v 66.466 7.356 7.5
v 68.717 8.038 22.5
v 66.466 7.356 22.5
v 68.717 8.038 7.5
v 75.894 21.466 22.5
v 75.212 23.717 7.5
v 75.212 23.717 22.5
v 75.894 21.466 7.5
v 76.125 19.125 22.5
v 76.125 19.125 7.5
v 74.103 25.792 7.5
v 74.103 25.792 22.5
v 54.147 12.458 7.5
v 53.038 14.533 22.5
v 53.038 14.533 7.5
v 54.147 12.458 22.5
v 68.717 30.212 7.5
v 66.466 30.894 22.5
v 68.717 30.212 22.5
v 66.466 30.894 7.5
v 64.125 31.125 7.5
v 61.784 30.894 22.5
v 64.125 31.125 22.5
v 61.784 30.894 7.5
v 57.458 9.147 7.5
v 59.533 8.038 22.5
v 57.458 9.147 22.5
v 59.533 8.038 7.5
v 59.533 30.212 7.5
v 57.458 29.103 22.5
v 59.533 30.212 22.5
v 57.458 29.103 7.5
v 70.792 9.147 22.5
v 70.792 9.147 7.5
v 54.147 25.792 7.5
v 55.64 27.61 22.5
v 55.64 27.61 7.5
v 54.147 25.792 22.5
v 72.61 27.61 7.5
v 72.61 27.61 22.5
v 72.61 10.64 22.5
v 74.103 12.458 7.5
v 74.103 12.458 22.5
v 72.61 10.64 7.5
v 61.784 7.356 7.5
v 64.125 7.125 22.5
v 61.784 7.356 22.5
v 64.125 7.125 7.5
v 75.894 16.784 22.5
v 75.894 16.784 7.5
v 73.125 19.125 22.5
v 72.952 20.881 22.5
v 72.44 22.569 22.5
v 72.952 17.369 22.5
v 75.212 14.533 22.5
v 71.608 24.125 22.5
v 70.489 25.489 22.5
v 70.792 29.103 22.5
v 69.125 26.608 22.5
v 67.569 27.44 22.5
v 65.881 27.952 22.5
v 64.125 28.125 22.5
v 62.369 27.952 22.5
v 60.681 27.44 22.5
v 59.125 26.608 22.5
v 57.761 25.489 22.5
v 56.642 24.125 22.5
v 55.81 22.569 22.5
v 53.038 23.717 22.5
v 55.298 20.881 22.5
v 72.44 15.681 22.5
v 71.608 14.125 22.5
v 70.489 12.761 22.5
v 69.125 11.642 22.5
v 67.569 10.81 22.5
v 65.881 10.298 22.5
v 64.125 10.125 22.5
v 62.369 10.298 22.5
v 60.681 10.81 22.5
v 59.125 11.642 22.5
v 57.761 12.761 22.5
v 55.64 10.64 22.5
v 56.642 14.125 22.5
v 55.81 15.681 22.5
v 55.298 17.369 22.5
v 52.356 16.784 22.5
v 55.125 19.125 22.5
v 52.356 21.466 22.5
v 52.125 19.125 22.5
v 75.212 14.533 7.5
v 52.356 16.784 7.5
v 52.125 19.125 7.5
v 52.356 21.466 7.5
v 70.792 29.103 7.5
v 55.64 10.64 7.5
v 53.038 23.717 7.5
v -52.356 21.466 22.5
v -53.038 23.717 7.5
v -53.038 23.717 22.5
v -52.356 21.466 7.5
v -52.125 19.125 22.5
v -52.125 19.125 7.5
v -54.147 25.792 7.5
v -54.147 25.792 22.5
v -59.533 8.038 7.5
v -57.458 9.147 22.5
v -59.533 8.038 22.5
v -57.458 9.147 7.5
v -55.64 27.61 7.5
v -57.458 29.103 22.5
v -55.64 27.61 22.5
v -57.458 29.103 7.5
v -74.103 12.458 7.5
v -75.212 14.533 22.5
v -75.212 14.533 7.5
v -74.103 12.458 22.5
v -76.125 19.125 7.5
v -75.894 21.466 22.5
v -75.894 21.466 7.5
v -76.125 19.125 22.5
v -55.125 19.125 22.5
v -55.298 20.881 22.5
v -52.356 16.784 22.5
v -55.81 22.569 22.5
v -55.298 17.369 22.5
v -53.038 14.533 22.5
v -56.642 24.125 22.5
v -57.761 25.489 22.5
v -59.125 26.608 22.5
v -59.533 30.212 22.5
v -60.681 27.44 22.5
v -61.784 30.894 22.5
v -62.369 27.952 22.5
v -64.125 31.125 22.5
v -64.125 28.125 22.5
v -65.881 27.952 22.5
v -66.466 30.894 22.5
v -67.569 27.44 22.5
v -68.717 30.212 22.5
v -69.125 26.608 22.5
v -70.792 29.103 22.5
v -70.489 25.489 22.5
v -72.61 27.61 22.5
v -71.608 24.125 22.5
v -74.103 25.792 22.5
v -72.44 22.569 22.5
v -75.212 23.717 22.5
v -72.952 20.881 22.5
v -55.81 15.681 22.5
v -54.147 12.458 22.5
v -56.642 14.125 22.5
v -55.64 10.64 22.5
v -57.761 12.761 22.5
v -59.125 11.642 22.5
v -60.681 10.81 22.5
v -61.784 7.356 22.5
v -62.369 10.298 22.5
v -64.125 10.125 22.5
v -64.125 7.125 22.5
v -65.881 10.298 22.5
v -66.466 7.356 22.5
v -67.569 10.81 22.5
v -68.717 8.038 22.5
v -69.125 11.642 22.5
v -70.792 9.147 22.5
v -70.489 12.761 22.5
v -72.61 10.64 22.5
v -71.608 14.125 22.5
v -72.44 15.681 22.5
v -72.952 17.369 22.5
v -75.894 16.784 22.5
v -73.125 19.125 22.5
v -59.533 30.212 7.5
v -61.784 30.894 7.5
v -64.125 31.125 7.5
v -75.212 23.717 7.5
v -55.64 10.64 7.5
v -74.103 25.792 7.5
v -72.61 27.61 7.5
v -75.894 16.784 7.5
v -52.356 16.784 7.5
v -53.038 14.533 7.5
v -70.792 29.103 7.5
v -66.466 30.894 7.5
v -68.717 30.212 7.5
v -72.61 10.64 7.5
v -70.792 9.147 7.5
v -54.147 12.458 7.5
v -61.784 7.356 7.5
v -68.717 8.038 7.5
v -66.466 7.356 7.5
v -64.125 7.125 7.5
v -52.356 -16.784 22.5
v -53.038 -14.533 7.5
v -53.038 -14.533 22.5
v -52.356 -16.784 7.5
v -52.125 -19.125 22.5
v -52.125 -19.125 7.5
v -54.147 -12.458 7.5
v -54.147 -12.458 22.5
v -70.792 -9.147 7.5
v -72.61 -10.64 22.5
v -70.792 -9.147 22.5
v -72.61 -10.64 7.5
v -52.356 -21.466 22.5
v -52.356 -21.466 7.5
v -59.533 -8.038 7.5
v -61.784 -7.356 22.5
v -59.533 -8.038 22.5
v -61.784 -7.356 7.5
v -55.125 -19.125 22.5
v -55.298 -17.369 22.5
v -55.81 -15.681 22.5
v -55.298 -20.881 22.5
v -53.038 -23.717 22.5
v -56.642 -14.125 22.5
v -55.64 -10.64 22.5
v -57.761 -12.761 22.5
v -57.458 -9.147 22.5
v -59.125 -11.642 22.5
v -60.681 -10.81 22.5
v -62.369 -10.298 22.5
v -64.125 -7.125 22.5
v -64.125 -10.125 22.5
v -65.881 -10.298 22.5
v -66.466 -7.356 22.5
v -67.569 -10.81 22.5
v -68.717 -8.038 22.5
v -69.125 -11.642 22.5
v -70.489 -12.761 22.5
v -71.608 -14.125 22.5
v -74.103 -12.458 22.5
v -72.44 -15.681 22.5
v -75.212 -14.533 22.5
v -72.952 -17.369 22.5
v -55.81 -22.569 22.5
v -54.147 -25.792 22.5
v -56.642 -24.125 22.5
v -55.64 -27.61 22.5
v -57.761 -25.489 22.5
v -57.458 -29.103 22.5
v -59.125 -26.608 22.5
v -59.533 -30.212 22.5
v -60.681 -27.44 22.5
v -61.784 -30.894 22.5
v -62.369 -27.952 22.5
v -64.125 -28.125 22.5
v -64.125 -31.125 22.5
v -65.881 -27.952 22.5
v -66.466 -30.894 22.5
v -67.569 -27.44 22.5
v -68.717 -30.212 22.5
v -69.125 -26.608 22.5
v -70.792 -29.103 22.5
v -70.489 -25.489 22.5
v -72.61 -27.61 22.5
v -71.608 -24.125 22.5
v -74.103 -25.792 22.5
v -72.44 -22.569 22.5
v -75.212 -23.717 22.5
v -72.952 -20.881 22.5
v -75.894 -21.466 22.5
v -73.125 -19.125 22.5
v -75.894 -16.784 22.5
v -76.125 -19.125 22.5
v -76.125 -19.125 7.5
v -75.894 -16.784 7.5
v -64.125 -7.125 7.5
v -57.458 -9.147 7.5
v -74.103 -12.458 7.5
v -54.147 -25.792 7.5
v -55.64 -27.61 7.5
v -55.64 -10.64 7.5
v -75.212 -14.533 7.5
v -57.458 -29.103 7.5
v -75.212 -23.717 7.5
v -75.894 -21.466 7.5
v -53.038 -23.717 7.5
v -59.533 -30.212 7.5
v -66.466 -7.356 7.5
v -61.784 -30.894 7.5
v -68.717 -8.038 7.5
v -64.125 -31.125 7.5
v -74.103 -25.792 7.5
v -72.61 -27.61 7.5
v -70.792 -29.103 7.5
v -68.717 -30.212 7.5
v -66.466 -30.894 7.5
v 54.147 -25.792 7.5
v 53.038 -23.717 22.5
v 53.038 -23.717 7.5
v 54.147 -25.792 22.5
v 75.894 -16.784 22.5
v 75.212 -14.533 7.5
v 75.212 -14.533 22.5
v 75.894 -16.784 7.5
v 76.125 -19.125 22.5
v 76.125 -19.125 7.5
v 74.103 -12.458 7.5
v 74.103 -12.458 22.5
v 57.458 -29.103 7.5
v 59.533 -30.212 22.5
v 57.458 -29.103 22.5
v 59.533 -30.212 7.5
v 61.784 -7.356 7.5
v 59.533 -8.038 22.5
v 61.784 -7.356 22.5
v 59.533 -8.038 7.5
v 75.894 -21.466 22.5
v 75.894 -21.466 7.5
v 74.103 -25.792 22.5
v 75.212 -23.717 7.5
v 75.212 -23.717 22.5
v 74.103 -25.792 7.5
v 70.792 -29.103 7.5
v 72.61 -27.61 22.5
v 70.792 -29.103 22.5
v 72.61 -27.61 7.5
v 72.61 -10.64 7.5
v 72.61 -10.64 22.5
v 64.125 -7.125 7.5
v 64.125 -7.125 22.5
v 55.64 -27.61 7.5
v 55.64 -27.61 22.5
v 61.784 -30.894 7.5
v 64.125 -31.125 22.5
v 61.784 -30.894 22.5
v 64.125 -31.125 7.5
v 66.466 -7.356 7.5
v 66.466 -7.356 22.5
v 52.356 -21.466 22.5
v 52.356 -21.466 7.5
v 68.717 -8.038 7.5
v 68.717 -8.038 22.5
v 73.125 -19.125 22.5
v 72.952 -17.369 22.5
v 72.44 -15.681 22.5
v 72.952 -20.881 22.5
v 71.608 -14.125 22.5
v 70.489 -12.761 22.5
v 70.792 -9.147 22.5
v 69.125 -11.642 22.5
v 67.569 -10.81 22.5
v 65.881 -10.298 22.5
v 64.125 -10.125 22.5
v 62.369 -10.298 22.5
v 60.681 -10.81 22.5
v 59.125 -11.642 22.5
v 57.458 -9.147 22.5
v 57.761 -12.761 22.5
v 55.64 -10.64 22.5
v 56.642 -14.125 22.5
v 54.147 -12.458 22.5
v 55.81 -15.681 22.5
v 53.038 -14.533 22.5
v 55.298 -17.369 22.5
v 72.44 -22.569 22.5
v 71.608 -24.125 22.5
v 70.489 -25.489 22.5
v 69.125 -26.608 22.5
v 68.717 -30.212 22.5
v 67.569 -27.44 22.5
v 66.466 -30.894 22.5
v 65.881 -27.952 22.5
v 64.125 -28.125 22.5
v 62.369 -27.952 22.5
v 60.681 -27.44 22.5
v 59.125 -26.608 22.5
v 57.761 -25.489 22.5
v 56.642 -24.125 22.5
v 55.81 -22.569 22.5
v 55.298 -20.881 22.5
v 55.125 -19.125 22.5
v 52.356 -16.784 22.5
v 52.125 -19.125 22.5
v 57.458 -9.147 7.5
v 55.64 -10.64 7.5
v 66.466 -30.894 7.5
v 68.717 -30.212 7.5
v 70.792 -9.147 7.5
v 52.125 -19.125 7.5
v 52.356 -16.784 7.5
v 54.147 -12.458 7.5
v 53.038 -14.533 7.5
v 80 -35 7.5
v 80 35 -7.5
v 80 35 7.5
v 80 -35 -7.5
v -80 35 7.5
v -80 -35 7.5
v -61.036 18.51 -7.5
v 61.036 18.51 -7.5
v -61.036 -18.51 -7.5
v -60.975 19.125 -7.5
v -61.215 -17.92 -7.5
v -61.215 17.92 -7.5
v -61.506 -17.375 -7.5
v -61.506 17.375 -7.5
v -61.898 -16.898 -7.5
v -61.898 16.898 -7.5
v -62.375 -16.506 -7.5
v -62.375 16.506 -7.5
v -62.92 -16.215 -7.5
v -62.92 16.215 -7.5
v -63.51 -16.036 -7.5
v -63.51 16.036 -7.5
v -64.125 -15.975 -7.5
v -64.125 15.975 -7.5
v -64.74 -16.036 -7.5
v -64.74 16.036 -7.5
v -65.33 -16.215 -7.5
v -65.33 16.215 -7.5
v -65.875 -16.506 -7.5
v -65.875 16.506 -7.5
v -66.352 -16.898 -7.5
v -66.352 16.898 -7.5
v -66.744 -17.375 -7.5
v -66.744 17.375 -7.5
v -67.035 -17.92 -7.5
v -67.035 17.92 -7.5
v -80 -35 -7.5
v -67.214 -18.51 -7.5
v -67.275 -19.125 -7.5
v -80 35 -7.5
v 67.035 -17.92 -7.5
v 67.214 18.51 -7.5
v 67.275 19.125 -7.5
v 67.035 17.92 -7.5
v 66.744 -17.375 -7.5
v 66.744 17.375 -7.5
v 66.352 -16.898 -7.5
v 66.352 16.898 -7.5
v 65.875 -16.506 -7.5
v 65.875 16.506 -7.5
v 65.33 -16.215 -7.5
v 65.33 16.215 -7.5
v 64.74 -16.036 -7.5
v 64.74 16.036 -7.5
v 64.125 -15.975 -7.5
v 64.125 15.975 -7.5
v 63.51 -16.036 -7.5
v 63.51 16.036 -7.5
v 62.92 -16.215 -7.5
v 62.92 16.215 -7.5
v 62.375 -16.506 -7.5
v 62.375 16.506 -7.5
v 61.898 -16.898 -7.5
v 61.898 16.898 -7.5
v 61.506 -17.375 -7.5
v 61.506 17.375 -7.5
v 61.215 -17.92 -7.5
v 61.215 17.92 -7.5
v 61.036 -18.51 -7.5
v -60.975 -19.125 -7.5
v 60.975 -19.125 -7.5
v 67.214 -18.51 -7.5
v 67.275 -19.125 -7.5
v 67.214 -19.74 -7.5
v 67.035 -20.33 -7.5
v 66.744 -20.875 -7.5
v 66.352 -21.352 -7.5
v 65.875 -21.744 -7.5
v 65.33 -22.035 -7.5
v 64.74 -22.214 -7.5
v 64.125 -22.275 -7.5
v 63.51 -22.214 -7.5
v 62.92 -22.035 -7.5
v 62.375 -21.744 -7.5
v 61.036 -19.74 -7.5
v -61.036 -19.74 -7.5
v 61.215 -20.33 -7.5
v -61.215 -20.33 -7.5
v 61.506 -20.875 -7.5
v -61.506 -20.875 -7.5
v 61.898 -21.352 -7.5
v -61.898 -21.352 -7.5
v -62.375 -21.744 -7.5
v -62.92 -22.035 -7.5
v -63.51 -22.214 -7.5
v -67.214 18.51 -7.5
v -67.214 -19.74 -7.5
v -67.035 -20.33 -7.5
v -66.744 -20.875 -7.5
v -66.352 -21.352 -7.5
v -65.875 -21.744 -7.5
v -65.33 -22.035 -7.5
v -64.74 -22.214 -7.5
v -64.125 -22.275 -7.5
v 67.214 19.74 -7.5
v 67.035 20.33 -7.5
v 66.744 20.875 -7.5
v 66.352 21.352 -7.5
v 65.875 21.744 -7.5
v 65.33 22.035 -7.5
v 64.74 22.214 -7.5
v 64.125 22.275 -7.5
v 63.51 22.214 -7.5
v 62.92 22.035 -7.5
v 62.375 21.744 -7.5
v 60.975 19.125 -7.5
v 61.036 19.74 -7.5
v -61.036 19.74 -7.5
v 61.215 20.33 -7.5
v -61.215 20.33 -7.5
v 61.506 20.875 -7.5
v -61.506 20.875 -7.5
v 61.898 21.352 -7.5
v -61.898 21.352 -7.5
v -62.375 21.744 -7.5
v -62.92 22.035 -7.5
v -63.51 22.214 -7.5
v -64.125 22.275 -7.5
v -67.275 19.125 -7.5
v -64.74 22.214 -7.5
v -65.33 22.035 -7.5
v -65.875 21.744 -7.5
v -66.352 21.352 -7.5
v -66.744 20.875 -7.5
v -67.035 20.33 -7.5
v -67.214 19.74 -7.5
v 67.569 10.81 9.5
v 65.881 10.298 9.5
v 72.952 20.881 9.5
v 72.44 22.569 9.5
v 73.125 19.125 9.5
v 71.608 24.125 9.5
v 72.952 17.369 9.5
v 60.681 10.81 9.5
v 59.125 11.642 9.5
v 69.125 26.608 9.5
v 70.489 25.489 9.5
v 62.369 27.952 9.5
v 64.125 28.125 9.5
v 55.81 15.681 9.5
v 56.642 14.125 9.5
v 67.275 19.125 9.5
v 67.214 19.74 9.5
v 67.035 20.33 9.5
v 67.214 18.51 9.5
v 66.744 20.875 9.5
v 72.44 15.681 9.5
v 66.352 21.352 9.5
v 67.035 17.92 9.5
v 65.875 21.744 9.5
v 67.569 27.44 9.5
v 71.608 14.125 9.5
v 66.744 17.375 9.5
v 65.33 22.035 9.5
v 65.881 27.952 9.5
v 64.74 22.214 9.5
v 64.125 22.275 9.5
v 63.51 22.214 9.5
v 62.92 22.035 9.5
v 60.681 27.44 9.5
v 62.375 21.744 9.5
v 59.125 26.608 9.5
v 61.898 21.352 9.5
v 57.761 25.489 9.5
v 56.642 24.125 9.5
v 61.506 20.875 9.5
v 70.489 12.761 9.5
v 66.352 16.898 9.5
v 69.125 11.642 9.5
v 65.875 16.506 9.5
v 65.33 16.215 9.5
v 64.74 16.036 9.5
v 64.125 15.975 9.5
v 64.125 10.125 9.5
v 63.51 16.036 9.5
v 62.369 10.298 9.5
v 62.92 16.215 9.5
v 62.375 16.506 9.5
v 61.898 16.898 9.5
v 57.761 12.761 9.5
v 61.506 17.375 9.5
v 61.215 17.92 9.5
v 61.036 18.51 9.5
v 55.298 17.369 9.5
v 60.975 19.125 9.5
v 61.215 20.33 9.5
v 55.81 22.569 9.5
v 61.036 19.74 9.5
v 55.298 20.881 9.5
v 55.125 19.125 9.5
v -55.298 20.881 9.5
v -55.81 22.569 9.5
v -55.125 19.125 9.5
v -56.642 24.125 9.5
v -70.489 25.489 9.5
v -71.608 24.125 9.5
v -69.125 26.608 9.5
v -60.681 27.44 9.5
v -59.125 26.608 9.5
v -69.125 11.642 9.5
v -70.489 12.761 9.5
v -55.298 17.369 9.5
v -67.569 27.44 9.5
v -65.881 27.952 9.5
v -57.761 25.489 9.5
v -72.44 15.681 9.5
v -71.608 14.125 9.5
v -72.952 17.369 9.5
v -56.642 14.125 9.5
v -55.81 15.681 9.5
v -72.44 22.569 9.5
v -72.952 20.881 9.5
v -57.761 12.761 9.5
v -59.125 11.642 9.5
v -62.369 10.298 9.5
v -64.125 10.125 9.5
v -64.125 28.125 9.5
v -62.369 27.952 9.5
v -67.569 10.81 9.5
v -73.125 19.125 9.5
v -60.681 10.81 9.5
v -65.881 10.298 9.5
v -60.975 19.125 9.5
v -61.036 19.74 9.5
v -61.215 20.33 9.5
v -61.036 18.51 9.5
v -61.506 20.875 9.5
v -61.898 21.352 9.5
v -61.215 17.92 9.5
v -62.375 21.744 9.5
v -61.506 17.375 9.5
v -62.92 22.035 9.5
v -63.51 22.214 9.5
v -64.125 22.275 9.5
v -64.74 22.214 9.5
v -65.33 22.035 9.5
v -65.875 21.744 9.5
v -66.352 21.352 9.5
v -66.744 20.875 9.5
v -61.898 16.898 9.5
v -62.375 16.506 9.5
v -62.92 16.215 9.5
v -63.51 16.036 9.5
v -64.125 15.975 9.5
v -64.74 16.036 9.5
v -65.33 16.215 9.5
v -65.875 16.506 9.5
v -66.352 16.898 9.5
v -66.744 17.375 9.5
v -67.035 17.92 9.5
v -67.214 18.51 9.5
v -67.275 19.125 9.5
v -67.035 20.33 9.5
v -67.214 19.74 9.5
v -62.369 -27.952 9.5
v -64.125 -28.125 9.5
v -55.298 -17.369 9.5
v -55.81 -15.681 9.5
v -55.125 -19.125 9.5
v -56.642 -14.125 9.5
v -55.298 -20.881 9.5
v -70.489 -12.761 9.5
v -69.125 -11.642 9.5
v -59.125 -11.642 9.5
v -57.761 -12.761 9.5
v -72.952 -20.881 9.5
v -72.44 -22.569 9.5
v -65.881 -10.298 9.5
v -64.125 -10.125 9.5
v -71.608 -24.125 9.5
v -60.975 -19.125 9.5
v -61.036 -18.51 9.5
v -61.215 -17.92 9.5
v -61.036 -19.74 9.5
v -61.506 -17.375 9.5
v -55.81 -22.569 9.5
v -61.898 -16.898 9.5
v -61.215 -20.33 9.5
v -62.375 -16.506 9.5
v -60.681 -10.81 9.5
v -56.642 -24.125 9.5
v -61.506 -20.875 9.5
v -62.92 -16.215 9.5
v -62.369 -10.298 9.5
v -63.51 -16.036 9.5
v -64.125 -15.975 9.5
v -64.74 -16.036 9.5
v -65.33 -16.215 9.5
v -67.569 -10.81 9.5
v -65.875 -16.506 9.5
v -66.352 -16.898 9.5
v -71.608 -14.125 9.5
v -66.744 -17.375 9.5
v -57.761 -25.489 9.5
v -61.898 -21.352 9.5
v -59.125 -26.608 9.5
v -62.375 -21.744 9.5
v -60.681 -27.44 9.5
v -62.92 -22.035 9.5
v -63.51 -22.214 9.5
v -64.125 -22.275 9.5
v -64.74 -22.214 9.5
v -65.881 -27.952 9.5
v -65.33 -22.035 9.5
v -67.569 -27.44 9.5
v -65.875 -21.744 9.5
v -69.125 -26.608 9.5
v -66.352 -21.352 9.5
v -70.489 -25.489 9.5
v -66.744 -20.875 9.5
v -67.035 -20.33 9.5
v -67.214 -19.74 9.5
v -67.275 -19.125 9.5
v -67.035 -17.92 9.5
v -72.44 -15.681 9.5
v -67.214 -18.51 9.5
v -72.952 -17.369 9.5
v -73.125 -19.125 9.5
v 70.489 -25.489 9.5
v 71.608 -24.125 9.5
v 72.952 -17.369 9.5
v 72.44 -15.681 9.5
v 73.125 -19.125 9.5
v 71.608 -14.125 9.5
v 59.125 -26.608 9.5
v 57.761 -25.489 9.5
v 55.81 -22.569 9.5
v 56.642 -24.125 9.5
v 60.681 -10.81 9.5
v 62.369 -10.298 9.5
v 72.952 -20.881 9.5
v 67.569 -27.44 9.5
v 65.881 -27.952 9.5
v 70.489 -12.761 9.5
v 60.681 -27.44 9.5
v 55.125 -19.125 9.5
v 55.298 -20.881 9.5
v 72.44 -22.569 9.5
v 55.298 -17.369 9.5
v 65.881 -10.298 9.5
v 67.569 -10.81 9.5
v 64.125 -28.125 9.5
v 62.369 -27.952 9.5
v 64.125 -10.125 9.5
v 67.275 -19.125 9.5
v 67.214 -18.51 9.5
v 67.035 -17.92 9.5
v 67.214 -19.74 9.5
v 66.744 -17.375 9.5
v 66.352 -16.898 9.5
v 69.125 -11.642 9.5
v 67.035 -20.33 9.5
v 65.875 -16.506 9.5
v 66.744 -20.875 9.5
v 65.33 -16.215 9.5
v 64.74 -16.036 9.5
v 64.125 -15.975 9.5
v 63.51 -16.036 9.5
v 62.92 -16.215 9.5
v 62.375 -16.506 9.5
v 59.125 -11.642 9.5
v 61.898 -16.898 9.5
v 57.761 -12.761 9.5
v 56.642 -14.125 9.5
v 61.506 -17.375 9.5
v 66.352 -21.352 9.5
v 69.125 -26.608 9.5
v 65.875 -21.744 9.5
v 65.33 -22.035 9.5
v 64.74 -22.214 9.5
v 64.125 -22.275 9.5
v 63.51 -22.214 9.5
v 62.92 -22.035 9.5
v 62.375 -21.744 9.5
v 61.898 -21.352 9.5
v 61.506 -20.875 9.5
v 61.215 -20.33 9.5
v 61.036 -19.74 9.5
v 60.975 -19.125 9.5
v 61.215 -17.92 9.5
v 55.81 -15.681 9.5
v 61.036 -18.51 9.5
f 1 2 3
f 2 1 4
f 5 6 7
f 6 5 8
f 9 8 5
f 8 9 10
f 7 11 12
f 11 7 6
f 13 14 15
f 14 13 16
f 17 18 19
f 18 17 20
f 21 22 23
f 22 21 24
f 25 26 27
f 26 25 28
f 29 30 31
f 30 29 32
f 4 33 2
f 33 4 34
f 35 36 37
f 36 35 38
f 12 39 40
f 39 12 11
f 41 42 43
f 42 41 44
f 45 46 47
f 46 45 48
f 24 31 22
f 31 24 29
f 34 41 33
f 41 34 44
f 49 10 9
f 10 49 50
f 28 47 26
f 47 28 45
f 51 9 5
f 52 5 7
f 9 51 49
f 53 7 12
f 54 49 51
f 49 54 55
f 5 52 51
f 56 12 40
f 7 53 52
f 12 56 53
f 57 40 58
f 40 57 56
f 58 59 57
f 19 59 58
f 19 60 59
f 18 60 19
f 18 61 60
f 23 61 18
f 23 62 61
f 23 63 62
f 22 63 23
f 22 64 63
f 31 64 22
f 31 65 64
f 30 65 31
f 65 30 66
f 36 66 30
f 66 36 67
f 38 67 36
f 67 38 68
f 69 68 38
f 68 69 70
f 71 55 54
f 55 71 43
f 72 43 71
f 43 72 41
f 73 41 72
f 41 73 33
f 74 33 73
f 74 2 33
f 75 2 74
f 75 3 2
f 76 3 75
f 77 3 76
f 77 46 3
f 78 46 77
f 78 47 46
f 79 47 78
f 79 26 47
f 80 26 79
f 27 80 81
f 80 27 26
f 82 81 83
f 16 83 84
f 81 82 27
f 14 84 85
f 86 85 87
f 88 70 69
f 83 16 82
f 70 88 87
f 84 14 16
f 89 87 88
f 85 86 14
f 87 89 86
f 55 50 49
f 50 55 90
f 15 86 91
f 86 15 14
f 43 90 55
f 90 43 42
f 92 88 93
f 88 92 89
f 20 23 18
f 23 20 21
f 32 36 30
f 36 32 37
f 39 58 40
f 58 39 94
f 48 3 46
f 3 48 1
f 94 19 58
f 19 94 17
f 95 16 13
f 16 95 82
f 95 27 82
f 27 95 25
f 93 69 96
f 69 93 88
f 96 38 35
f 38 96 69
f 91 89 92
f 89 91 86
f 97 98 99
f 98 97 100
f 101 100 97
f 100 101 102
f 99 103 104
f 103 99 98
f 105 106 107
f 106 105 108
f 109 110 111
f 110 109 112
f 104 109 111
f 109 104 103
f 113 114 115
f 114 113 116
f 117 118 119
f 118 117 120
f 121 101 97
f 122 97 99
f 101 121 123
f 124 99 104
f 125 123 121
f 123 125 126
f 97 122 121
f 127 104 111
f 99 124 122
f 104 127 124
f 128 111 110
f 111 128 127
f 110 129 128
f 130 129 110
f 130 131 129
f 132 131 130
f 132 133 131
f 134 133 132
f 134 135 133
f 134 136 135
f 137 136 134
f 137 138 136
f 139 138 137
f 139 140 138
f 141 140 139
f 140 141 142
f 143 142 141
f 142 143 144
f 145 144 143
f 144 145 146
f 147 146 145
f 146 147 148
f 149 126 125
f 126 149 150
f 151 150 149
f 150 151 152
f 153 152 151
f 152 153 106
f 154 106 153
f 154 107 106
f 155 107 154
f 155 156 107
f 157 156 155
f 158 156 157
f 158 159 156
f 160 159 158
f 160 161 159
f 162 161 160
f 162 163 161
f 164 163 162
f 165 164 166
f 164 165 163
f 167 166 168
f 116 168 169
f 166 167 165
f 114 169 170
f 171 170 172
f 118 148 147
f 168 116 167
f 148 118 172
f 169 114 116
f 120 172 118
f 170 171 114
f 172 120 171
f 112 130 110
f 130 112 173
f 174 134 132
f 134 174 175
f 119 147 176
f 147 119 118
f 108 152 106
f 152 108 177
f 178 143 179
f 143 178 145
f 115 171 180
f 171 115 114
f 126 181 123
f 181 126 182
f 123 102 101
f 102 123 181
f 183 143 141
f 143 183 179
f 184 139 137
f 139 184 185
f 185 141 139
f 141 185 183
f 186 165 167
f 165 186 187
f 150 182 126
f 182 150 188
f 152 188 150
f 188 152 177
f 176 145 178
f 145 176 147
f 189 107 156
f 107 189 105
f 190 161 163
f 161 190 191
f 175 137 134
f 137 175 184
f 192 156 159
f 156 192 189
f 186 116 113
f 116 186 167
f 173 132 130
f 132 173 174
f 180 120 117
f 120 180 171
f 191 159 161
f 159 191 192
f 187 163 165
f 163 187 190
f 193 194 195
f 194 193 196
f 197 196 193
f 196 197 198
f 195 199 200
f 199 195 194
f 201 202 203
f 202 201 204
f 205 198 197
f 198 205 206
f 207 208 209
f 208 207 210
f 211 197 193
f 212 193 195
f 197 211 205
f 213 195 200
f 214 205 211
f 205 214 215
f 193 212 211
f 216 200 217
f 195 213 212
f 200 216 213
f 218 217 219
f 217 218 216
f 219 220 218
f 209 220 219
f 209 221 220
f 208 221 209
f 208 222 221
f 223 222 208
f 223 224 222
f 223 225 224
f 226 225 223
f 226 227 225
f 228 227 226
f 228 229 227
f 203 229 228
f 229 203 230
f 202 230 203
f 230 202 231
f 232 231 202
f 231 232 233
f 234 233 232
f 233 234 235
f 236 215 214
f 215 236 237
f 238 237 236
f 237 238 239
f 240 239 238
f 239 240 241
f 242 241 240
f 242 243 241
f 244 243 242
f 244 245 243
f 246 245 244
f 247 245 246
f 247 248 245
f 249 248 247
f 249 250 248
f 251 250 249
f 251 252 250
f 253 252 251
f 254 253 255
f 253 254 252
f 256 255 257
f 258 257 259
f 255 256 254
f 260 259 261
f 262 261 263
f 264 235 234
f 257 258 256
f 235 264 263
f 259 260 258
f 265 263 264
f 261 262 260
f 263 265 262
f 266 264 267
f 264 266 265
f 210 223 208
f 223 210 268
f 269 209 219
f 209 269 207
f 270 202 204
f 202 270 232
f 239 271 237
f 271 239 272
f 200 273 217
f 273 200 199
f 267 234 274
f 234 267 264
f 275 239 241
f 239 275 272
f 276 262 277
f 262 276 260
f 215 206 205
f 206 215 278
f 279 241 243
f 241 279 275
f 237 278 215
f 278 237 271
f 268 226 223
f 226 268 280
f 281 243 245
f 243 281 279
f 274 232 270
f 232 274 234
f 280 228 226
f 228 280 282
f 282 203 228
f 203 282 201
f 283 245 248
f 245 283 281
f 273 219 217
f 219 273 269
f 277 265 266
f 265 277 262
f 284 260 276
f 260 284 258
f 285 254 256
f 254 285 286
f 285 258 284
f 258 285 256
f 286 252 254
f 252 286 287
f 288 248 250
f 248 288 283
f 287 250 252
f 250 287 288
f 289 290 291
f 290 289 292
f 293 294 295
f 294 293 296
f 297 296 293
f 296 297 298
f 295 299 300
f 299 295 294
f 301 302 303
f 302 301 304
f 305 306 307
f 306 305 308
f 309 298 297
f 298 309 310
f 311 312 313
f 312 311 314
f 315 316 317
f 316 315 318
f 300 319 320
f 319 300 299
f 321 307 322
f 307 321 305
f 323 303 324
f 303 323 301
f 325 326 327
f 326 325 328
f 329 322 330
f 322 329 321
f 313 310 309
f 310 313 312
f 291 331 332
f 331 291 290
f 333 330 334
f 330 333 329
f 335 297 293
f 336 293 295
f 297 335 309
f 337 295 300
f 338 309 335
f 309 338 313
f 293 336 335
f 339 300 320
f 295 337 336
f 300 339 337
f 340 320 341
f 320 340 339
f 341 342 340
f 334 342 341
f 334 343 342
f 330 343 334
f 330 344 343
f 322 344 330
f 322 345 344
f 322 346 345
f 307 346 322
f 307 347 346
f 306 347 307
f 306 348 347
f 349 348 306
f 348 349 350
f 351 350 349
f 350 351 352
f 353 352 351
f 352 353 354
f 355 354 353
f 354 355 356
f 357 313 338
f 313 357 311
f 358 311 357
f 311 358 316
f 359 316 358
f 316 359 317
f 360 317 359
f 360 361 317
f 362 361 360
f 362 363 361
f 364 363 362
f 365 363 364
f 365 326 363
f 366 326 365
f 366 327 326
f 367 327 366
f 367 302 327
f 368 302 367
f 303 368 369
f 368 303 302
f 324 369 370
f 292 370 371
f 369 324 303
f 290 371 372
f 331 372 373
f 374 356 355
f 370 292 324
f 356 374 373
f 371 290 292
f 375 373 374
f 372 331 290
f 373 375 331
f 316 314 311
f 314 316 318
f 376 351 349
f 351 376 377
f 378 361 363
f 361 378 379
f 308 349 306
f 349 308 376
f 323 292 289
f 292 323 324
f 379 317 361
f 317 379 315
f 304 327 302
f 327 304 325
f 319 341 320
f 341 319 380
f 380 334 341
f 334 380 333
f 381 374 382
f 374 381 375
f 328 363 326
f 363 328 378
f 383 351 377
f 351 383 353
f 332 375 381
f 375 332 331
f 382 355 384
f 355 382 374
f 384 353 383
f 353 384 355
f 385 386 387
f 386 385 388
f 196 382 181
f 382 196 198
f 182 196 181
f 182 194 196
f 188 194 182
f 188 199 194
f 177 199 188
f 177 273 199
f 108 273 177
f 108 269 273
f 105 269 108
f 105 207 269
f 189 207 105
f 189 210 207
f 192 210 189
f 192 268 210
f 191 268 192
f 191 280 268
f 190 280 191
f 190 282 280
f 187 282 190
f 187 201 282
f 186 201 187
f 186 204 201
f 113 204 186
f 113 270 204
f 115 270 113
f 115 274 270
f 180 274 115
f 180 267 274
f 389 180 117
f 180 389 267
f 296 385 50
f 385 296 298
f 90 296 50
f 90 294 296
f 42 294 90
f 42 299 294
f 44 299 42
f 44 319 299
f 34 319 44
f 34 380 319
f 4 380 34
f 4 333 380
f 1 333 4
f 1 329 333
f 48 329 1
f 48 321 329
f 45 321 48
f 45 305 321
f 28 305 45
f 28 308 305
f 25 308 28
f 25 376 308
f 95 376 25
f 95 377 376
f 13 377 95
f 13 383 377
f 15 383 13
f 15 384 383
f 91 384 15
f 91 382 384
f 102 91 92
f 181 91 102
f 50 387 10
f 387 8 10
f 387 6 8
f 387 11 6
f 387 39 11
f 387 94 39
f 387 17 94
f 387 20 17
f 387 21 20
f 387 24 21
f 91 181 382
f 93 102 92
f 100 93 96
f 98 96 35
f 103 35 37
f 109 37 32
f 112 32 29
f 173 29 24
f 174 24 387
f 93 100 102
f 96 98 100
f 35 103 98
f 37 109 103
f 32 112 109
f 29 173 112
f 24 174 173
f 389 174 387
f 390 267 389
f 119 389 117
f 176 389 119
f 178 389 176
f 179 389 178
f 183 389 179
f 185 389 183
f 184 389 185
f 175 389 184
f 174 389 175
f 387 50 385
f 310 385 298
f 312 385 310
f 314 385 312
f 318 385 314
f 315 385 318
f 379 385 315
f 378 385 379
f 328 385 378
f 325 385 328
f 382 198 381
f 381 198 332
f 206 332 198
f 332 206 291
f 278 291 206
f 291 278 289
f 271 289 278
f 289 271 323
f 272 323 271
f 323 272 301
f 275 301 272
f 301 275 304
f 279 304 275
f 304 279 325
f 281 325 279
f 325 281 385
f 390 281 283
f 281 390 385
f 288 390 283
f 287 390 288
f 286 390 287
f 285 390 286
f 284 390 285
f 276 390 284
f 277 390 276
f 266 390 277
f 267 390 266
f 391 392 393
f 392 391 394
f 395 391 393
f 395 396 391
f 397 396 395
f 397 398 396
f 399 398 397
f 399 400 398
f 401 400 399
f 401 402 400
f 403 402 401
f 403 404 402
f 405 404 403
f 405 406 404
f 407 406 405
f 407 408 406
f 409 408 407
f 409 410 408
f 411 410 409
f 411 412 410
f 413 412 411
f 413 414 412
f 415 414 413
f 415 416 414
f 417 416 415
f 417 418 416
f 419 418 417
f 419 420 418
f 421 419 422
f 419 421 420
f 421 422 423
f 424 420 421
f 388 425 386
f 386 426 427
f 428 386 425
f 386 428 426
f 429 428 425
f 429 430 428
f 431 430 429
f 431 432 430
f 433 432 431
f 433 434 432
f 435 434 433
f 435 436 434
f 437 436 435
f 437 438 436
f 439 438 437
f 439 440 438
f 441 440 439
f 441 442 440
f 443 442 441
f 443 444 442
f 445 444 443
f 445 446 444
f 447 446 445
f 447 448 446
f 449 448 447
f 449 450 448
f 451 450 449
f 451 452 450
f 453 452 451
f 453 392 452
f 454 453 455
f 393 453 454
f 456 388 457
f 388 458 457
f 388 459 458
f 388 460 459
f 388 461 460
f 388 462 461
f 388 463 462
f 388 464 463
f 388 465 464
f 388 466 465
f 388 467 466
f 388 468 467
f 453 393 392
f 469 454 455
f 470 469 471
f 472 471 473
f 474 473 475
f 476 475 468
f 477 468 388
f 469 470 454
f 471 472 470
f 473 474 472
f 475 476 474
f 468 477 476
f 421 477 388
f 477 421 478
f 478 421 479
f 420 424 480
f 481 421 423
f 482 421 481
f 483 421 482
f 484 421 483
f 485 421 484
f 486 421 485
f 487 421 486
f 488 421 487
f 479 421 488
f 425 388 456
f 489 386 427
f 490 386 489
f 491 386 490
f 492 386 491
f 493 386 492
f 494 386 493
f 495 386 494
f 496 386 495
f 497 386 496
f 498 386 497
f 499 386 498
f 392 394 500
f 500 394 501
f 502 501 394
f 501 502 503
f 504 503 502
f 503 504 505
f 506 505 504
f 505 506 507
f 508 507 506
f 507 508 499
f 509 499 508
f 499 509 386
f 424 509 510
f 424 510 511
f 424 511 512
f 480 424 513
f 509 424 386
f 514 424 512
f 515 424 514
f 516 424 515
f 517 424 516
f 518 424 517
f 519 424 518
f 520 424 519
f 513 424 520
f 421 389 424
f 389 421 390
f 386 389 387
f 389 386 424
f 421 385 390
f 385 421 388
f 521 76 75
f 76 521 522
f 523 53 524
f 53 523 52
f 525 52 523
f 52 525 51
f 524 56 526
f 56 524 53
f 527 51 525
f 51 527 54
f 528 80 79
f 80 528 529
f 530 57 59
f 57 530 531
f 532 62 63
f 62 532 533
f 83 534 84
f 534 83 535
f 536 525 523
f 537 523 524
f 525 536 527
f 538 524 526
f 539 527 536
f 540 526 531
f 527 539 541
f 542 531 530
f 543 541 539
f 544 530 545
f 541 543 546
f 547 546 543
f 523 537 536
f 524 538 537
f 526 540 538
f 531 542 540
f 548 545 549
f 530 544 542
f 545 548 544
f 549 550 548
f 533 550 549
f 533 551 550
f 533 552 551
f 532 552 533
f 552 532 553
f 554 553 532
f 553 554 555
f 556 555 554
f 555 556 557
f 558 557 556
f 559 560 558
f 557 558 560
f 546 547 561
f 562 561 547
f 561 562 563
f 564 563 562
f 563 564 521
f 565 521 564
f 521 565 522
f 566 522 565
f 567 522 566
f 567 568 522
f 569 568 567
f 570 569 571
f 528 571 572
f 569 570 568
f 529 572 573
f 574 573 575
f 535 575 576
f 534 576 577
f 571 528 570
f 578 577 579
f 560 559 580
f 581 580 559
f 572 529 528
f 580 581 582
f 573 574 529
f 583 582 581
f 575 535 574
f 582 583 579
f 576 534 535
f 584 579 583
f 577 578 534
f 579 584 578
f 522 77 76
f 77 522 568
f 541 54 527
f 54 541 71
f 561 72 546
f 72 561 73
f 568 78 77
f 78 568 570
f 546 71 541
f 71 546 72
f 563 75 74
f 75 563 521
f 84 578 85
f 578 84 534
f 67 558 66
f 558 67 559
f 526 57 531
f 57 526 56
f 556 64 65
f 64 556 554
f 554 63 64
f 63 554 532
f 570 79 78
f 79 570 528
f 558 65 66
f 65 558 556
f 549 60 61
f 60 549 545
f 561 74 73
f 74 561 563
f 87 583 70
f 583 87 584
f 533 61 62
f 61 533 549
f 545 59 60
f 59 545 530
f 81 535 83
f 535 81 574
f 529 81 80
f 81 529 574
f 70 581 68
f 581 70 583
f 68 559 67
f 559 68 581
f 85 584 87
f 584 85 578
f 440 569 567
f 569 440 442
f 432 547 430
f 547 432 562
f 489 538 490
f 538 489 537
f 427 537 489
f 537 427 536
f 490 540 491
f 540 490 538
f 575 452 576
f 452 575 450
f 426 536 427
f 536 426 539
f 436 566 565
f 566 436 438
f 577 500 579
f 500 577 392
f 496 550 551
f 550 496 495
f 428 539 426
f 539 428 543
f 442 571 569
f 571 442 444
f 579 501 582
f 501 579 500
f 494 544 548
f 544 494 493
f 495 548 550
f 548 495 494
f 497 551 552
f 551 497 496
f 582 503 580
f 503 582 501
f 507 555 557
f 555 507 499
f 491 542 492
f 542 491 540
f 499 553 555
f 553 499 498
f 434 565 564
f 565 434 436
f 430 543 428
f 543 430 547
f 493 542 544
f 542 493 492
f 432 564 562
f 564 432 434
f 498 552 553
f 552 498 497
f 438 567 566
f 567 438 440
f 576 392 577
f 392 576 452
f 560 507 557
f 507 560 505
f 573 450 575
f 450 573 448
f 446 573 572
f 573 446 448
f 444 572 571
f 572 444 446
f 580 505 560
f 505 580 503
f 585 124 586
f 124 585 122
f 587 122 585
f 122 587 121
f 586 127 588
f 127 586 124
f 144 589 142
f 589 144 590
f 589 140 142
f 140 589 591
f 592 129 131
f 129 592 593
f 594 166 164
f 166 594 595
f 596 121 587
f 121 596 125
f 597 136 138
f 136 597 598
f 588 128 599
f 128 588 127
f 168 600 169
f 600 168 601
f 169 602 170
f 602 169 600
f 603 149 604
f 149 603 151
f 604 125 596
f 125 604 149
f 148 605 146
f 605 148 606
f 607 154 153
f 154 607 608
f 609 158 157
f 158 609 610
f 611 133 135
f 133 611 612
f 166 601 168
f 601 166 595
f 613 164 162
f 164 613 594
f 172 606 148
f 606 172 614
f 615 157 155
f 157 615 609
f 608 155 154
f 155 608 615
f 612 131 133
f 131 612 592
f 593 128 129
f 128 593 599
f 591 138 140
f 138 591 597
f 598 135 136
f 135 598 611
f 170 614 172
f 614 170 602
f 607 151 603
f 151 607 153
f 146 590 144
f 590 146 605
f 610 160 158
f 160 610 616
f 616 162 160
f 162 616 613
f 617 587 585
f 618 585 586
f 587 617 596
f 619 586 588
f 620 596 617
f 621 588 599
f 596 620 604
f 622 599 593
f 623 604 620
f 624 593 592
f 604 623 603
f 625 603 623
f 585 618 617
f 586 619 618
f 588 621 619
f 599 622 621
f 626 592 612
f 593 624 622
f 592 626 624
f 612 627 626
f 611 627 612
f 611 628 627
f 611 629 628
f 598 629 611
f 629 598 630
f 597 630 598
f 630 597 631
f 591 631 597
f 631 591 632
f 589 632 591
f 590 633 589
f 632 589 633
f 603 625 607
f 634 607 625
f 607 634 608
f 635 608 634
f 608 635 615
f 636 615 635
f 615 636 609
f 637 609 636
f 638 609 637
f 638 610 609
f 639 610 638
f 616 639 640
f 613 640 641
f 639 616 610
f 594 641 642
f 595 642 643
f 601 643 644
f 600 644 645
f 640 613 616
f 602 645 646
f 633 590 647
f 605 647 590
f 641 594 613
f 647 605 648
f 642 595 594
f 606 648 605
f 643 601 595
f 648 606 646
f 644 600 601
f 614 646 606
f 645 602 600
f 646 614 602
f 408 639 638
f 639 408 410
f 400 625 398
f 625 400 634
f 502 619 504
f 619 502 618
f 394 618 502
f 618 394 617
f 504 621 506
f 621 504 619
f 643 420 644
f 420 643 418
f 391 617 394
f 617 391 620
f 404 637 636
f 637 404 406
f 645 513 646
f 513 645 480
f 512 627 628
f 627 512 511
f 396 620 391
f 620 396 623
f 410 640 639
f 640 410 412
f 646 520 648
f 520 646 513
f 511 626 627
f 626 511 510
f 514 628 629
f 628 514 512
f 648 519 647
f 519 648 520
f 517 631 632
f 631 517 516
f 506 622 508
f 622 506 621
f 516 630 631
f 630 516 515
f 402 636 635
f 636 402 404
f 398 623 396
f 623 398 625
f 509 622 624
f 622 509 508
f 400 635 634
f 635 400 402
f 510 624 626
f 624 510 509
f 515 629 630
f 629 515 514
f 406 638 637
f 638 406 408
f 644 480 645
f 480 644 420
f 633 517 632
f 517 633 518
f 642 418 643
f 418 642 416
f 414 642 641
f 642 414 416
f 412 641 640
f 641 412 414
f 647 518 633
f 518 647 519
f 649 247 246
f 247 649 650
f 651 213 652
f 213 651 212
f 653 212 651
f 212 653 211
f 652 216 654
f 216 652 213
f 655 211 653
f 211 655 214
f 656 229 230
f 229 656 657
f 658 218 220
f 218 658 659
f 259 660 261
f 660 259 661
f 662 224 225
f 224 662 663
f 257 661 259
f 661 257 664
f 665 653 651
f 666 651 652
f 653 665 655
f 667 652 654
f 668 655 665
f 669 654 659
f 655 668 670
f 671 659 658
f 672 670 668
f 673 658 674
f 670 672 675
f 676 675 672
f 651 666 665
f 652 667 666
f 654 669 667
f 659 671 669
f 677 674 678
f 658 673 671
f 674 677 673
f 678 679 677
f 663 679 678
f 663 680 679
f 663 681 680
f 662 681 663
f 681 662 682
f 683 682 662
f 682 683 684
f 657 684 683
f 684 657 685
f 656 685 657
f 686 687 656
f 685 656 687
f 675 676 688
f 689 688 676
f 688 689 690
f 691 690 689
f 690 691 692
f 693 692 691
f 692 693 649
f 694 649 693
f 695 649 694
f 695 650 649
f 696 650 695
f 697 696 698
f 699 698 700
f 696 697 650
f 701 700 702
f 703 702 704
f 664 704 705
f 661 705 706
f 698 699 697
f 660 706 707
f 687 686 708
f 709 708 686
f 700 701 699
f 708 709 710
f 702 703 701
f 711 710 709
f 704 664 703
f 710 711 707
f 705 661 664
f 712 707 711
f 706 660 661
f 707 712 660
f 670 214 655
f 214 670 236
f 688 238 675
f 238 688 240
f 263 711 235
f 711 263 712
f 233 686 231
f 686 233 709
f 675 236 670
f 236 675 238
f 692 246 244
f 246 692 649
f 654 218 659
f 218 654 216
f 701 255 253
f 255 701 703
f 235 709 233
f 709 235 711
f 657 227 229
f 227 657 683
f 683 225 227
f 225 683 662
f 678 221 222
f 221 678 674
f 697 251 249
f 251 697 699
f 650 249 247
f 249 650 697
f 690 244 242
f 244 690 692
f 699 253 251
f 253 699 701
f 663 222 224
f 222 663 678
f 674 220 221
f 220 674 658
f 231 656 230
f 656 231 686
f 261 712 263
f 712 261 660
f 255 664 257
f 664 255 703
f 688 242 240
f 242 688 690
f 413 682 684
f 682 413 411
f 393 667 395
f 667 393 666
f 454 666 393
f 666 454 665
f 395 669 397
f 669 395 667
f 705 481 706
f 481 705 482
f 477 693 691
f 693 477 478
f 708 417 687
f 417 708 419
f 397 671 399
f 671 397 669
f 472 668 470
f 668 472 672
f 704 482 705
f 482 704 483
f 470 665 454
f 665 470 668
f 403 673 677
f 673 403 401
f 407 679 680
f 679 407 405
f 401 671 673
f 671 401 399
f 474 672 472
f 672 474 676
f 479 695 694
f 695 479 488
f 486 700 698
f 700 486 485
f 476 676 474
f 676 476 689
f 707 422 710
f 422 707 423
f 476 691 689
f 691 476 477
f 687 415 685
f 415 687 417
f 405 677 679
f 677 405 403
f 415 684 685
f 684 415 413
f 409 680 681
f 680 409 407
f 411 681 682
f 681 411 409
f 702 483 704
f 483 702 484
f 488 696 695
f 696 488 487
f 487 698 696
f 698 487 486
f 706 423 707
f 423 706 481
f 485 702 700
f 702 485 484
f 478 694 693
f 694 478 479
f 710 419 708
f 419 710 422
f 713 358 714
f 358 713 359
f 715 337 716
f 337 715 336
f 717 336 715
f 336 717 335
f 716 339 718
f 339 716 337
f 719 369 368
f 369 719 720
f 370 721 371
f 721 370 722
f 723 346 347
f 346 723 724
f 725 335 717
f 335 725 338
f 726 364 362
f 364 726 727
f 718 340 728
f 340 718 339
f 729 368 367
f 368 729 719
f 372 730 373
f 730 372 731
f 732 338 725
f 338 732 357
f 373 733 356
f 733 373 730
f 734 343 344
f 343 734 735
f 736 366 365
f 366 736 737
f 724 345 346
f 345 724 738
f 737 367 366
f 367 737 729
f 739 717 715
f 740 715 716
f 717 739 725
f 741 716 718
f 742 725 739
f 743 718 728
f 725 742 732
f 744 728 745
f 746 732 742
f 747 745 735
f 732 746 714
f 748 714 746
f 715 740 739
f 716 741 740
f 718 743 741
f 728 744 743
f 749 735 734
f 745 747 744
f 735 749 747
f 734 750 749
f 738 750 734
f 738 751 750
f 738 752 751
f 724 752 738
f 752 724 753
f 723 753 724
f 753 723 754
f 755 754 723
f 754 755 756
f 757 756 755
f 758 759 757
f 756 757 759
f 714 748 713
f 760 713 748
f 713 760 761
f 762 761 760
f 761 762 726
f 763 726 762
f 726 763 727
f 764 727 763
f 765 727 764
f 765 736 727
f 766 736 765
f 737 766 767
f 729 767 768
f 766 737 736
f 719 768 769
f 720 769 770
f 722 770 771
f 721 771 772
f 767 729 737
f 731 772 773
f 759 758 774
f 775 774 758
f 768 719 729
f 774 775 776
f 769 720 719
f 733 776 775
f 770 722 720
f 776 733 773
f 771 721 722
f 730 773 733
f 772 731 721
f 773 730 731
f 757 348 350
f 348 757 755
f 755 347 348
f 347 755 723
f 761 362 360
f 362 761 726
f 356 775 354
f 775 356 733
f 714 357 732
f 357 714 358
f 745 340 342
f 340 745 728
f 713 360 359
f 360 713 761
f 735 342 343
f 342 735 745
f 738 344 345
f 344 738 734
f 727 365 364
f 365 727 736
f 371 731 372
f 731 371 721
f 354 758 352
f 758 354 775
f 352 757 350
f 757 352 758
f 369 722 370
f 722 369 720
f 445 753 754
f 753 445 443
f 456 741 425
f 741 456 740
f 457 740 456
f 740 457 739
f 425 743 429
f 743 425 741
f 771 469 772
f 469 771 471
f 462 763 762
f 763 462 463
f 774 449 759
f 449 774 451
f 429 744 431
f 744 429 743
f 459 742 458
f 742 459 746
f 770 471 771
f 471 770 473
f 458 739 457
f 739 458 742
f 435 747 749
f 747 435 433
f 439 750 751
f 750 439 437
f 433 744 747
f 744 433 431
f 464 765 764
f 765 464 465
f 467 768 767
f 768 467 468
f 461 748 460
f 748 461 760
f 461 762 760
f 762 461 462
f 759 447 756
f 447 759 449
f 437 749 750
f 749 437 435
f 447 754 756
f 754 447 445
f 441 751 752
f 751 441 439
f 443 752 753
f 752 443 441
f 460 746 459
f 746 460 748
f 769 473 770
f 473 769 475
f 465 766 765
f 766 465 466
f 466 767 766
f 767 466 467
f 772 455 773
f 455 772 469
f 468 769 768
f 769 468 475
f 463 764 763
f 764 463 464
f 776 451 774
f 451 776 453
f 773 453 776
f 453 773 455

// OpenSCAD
$fn = 32;

// ----------------------------------------------------------------------
// Socket pad plate
// bosses with counterbored sockets for the screws
// ----------------------------------------------------------------------

// --- parameters (mm) ---
base_t = 15;            // base plate thickness
boss_h = 15;            // boss height above the base plate
boss_d = 24;            // boss diameter
socket_d = 18;          // socket diameter
socket_depth = 13;      // socket depth from the boss face
bolt_d = 6.3;           // screw clearance hole through the socket floor
plate = [160, 70, 15];  // overall size (x, y, z)
edge = 15.875;          // boss centre offset from the plate edge
pads = 4;               // boss count, one per corner

// --- derived feature positions (mm) ---
height = base_t + boss_h;        // = 30   overall height of the part
corner_x = plate[0] / 2 - edge;  // = 64.12   boss centre X
corner_y = plate[1] / 2 - edge;  // = 19.12   boss centre Y
feature_centers = [
  [corner_x, corner_y],
  [-corner_x, corner_y],
  [-corner_x, -corner_y],
  [corner_x, -corner_y]
];   // boss centres: sockets, holes and the pads themselves are placed from here

// base plate, bosses on feature_centers, socket + through hole in each
difference() {
  union() {
    cube(plate, center = true);
    for (centre = feature_centers)
      translate([centre[0], centre[1], plate[2] / 2 - 1])
        cylinder(d = boss_d, h = boss_h + 1);
  }
  for (centre = feature_centers) {
    translate([centre[0], centre[1], plate[2] / 2 + boss_h - socket_depth])
      cylinder(d = socket_d, h = socket_depth + 1);
    translate([centre[0], centre[1], -height])
      cylinder(d = bolt_d, h = 2 * height + 2);  // through the socket floor
  }
}
